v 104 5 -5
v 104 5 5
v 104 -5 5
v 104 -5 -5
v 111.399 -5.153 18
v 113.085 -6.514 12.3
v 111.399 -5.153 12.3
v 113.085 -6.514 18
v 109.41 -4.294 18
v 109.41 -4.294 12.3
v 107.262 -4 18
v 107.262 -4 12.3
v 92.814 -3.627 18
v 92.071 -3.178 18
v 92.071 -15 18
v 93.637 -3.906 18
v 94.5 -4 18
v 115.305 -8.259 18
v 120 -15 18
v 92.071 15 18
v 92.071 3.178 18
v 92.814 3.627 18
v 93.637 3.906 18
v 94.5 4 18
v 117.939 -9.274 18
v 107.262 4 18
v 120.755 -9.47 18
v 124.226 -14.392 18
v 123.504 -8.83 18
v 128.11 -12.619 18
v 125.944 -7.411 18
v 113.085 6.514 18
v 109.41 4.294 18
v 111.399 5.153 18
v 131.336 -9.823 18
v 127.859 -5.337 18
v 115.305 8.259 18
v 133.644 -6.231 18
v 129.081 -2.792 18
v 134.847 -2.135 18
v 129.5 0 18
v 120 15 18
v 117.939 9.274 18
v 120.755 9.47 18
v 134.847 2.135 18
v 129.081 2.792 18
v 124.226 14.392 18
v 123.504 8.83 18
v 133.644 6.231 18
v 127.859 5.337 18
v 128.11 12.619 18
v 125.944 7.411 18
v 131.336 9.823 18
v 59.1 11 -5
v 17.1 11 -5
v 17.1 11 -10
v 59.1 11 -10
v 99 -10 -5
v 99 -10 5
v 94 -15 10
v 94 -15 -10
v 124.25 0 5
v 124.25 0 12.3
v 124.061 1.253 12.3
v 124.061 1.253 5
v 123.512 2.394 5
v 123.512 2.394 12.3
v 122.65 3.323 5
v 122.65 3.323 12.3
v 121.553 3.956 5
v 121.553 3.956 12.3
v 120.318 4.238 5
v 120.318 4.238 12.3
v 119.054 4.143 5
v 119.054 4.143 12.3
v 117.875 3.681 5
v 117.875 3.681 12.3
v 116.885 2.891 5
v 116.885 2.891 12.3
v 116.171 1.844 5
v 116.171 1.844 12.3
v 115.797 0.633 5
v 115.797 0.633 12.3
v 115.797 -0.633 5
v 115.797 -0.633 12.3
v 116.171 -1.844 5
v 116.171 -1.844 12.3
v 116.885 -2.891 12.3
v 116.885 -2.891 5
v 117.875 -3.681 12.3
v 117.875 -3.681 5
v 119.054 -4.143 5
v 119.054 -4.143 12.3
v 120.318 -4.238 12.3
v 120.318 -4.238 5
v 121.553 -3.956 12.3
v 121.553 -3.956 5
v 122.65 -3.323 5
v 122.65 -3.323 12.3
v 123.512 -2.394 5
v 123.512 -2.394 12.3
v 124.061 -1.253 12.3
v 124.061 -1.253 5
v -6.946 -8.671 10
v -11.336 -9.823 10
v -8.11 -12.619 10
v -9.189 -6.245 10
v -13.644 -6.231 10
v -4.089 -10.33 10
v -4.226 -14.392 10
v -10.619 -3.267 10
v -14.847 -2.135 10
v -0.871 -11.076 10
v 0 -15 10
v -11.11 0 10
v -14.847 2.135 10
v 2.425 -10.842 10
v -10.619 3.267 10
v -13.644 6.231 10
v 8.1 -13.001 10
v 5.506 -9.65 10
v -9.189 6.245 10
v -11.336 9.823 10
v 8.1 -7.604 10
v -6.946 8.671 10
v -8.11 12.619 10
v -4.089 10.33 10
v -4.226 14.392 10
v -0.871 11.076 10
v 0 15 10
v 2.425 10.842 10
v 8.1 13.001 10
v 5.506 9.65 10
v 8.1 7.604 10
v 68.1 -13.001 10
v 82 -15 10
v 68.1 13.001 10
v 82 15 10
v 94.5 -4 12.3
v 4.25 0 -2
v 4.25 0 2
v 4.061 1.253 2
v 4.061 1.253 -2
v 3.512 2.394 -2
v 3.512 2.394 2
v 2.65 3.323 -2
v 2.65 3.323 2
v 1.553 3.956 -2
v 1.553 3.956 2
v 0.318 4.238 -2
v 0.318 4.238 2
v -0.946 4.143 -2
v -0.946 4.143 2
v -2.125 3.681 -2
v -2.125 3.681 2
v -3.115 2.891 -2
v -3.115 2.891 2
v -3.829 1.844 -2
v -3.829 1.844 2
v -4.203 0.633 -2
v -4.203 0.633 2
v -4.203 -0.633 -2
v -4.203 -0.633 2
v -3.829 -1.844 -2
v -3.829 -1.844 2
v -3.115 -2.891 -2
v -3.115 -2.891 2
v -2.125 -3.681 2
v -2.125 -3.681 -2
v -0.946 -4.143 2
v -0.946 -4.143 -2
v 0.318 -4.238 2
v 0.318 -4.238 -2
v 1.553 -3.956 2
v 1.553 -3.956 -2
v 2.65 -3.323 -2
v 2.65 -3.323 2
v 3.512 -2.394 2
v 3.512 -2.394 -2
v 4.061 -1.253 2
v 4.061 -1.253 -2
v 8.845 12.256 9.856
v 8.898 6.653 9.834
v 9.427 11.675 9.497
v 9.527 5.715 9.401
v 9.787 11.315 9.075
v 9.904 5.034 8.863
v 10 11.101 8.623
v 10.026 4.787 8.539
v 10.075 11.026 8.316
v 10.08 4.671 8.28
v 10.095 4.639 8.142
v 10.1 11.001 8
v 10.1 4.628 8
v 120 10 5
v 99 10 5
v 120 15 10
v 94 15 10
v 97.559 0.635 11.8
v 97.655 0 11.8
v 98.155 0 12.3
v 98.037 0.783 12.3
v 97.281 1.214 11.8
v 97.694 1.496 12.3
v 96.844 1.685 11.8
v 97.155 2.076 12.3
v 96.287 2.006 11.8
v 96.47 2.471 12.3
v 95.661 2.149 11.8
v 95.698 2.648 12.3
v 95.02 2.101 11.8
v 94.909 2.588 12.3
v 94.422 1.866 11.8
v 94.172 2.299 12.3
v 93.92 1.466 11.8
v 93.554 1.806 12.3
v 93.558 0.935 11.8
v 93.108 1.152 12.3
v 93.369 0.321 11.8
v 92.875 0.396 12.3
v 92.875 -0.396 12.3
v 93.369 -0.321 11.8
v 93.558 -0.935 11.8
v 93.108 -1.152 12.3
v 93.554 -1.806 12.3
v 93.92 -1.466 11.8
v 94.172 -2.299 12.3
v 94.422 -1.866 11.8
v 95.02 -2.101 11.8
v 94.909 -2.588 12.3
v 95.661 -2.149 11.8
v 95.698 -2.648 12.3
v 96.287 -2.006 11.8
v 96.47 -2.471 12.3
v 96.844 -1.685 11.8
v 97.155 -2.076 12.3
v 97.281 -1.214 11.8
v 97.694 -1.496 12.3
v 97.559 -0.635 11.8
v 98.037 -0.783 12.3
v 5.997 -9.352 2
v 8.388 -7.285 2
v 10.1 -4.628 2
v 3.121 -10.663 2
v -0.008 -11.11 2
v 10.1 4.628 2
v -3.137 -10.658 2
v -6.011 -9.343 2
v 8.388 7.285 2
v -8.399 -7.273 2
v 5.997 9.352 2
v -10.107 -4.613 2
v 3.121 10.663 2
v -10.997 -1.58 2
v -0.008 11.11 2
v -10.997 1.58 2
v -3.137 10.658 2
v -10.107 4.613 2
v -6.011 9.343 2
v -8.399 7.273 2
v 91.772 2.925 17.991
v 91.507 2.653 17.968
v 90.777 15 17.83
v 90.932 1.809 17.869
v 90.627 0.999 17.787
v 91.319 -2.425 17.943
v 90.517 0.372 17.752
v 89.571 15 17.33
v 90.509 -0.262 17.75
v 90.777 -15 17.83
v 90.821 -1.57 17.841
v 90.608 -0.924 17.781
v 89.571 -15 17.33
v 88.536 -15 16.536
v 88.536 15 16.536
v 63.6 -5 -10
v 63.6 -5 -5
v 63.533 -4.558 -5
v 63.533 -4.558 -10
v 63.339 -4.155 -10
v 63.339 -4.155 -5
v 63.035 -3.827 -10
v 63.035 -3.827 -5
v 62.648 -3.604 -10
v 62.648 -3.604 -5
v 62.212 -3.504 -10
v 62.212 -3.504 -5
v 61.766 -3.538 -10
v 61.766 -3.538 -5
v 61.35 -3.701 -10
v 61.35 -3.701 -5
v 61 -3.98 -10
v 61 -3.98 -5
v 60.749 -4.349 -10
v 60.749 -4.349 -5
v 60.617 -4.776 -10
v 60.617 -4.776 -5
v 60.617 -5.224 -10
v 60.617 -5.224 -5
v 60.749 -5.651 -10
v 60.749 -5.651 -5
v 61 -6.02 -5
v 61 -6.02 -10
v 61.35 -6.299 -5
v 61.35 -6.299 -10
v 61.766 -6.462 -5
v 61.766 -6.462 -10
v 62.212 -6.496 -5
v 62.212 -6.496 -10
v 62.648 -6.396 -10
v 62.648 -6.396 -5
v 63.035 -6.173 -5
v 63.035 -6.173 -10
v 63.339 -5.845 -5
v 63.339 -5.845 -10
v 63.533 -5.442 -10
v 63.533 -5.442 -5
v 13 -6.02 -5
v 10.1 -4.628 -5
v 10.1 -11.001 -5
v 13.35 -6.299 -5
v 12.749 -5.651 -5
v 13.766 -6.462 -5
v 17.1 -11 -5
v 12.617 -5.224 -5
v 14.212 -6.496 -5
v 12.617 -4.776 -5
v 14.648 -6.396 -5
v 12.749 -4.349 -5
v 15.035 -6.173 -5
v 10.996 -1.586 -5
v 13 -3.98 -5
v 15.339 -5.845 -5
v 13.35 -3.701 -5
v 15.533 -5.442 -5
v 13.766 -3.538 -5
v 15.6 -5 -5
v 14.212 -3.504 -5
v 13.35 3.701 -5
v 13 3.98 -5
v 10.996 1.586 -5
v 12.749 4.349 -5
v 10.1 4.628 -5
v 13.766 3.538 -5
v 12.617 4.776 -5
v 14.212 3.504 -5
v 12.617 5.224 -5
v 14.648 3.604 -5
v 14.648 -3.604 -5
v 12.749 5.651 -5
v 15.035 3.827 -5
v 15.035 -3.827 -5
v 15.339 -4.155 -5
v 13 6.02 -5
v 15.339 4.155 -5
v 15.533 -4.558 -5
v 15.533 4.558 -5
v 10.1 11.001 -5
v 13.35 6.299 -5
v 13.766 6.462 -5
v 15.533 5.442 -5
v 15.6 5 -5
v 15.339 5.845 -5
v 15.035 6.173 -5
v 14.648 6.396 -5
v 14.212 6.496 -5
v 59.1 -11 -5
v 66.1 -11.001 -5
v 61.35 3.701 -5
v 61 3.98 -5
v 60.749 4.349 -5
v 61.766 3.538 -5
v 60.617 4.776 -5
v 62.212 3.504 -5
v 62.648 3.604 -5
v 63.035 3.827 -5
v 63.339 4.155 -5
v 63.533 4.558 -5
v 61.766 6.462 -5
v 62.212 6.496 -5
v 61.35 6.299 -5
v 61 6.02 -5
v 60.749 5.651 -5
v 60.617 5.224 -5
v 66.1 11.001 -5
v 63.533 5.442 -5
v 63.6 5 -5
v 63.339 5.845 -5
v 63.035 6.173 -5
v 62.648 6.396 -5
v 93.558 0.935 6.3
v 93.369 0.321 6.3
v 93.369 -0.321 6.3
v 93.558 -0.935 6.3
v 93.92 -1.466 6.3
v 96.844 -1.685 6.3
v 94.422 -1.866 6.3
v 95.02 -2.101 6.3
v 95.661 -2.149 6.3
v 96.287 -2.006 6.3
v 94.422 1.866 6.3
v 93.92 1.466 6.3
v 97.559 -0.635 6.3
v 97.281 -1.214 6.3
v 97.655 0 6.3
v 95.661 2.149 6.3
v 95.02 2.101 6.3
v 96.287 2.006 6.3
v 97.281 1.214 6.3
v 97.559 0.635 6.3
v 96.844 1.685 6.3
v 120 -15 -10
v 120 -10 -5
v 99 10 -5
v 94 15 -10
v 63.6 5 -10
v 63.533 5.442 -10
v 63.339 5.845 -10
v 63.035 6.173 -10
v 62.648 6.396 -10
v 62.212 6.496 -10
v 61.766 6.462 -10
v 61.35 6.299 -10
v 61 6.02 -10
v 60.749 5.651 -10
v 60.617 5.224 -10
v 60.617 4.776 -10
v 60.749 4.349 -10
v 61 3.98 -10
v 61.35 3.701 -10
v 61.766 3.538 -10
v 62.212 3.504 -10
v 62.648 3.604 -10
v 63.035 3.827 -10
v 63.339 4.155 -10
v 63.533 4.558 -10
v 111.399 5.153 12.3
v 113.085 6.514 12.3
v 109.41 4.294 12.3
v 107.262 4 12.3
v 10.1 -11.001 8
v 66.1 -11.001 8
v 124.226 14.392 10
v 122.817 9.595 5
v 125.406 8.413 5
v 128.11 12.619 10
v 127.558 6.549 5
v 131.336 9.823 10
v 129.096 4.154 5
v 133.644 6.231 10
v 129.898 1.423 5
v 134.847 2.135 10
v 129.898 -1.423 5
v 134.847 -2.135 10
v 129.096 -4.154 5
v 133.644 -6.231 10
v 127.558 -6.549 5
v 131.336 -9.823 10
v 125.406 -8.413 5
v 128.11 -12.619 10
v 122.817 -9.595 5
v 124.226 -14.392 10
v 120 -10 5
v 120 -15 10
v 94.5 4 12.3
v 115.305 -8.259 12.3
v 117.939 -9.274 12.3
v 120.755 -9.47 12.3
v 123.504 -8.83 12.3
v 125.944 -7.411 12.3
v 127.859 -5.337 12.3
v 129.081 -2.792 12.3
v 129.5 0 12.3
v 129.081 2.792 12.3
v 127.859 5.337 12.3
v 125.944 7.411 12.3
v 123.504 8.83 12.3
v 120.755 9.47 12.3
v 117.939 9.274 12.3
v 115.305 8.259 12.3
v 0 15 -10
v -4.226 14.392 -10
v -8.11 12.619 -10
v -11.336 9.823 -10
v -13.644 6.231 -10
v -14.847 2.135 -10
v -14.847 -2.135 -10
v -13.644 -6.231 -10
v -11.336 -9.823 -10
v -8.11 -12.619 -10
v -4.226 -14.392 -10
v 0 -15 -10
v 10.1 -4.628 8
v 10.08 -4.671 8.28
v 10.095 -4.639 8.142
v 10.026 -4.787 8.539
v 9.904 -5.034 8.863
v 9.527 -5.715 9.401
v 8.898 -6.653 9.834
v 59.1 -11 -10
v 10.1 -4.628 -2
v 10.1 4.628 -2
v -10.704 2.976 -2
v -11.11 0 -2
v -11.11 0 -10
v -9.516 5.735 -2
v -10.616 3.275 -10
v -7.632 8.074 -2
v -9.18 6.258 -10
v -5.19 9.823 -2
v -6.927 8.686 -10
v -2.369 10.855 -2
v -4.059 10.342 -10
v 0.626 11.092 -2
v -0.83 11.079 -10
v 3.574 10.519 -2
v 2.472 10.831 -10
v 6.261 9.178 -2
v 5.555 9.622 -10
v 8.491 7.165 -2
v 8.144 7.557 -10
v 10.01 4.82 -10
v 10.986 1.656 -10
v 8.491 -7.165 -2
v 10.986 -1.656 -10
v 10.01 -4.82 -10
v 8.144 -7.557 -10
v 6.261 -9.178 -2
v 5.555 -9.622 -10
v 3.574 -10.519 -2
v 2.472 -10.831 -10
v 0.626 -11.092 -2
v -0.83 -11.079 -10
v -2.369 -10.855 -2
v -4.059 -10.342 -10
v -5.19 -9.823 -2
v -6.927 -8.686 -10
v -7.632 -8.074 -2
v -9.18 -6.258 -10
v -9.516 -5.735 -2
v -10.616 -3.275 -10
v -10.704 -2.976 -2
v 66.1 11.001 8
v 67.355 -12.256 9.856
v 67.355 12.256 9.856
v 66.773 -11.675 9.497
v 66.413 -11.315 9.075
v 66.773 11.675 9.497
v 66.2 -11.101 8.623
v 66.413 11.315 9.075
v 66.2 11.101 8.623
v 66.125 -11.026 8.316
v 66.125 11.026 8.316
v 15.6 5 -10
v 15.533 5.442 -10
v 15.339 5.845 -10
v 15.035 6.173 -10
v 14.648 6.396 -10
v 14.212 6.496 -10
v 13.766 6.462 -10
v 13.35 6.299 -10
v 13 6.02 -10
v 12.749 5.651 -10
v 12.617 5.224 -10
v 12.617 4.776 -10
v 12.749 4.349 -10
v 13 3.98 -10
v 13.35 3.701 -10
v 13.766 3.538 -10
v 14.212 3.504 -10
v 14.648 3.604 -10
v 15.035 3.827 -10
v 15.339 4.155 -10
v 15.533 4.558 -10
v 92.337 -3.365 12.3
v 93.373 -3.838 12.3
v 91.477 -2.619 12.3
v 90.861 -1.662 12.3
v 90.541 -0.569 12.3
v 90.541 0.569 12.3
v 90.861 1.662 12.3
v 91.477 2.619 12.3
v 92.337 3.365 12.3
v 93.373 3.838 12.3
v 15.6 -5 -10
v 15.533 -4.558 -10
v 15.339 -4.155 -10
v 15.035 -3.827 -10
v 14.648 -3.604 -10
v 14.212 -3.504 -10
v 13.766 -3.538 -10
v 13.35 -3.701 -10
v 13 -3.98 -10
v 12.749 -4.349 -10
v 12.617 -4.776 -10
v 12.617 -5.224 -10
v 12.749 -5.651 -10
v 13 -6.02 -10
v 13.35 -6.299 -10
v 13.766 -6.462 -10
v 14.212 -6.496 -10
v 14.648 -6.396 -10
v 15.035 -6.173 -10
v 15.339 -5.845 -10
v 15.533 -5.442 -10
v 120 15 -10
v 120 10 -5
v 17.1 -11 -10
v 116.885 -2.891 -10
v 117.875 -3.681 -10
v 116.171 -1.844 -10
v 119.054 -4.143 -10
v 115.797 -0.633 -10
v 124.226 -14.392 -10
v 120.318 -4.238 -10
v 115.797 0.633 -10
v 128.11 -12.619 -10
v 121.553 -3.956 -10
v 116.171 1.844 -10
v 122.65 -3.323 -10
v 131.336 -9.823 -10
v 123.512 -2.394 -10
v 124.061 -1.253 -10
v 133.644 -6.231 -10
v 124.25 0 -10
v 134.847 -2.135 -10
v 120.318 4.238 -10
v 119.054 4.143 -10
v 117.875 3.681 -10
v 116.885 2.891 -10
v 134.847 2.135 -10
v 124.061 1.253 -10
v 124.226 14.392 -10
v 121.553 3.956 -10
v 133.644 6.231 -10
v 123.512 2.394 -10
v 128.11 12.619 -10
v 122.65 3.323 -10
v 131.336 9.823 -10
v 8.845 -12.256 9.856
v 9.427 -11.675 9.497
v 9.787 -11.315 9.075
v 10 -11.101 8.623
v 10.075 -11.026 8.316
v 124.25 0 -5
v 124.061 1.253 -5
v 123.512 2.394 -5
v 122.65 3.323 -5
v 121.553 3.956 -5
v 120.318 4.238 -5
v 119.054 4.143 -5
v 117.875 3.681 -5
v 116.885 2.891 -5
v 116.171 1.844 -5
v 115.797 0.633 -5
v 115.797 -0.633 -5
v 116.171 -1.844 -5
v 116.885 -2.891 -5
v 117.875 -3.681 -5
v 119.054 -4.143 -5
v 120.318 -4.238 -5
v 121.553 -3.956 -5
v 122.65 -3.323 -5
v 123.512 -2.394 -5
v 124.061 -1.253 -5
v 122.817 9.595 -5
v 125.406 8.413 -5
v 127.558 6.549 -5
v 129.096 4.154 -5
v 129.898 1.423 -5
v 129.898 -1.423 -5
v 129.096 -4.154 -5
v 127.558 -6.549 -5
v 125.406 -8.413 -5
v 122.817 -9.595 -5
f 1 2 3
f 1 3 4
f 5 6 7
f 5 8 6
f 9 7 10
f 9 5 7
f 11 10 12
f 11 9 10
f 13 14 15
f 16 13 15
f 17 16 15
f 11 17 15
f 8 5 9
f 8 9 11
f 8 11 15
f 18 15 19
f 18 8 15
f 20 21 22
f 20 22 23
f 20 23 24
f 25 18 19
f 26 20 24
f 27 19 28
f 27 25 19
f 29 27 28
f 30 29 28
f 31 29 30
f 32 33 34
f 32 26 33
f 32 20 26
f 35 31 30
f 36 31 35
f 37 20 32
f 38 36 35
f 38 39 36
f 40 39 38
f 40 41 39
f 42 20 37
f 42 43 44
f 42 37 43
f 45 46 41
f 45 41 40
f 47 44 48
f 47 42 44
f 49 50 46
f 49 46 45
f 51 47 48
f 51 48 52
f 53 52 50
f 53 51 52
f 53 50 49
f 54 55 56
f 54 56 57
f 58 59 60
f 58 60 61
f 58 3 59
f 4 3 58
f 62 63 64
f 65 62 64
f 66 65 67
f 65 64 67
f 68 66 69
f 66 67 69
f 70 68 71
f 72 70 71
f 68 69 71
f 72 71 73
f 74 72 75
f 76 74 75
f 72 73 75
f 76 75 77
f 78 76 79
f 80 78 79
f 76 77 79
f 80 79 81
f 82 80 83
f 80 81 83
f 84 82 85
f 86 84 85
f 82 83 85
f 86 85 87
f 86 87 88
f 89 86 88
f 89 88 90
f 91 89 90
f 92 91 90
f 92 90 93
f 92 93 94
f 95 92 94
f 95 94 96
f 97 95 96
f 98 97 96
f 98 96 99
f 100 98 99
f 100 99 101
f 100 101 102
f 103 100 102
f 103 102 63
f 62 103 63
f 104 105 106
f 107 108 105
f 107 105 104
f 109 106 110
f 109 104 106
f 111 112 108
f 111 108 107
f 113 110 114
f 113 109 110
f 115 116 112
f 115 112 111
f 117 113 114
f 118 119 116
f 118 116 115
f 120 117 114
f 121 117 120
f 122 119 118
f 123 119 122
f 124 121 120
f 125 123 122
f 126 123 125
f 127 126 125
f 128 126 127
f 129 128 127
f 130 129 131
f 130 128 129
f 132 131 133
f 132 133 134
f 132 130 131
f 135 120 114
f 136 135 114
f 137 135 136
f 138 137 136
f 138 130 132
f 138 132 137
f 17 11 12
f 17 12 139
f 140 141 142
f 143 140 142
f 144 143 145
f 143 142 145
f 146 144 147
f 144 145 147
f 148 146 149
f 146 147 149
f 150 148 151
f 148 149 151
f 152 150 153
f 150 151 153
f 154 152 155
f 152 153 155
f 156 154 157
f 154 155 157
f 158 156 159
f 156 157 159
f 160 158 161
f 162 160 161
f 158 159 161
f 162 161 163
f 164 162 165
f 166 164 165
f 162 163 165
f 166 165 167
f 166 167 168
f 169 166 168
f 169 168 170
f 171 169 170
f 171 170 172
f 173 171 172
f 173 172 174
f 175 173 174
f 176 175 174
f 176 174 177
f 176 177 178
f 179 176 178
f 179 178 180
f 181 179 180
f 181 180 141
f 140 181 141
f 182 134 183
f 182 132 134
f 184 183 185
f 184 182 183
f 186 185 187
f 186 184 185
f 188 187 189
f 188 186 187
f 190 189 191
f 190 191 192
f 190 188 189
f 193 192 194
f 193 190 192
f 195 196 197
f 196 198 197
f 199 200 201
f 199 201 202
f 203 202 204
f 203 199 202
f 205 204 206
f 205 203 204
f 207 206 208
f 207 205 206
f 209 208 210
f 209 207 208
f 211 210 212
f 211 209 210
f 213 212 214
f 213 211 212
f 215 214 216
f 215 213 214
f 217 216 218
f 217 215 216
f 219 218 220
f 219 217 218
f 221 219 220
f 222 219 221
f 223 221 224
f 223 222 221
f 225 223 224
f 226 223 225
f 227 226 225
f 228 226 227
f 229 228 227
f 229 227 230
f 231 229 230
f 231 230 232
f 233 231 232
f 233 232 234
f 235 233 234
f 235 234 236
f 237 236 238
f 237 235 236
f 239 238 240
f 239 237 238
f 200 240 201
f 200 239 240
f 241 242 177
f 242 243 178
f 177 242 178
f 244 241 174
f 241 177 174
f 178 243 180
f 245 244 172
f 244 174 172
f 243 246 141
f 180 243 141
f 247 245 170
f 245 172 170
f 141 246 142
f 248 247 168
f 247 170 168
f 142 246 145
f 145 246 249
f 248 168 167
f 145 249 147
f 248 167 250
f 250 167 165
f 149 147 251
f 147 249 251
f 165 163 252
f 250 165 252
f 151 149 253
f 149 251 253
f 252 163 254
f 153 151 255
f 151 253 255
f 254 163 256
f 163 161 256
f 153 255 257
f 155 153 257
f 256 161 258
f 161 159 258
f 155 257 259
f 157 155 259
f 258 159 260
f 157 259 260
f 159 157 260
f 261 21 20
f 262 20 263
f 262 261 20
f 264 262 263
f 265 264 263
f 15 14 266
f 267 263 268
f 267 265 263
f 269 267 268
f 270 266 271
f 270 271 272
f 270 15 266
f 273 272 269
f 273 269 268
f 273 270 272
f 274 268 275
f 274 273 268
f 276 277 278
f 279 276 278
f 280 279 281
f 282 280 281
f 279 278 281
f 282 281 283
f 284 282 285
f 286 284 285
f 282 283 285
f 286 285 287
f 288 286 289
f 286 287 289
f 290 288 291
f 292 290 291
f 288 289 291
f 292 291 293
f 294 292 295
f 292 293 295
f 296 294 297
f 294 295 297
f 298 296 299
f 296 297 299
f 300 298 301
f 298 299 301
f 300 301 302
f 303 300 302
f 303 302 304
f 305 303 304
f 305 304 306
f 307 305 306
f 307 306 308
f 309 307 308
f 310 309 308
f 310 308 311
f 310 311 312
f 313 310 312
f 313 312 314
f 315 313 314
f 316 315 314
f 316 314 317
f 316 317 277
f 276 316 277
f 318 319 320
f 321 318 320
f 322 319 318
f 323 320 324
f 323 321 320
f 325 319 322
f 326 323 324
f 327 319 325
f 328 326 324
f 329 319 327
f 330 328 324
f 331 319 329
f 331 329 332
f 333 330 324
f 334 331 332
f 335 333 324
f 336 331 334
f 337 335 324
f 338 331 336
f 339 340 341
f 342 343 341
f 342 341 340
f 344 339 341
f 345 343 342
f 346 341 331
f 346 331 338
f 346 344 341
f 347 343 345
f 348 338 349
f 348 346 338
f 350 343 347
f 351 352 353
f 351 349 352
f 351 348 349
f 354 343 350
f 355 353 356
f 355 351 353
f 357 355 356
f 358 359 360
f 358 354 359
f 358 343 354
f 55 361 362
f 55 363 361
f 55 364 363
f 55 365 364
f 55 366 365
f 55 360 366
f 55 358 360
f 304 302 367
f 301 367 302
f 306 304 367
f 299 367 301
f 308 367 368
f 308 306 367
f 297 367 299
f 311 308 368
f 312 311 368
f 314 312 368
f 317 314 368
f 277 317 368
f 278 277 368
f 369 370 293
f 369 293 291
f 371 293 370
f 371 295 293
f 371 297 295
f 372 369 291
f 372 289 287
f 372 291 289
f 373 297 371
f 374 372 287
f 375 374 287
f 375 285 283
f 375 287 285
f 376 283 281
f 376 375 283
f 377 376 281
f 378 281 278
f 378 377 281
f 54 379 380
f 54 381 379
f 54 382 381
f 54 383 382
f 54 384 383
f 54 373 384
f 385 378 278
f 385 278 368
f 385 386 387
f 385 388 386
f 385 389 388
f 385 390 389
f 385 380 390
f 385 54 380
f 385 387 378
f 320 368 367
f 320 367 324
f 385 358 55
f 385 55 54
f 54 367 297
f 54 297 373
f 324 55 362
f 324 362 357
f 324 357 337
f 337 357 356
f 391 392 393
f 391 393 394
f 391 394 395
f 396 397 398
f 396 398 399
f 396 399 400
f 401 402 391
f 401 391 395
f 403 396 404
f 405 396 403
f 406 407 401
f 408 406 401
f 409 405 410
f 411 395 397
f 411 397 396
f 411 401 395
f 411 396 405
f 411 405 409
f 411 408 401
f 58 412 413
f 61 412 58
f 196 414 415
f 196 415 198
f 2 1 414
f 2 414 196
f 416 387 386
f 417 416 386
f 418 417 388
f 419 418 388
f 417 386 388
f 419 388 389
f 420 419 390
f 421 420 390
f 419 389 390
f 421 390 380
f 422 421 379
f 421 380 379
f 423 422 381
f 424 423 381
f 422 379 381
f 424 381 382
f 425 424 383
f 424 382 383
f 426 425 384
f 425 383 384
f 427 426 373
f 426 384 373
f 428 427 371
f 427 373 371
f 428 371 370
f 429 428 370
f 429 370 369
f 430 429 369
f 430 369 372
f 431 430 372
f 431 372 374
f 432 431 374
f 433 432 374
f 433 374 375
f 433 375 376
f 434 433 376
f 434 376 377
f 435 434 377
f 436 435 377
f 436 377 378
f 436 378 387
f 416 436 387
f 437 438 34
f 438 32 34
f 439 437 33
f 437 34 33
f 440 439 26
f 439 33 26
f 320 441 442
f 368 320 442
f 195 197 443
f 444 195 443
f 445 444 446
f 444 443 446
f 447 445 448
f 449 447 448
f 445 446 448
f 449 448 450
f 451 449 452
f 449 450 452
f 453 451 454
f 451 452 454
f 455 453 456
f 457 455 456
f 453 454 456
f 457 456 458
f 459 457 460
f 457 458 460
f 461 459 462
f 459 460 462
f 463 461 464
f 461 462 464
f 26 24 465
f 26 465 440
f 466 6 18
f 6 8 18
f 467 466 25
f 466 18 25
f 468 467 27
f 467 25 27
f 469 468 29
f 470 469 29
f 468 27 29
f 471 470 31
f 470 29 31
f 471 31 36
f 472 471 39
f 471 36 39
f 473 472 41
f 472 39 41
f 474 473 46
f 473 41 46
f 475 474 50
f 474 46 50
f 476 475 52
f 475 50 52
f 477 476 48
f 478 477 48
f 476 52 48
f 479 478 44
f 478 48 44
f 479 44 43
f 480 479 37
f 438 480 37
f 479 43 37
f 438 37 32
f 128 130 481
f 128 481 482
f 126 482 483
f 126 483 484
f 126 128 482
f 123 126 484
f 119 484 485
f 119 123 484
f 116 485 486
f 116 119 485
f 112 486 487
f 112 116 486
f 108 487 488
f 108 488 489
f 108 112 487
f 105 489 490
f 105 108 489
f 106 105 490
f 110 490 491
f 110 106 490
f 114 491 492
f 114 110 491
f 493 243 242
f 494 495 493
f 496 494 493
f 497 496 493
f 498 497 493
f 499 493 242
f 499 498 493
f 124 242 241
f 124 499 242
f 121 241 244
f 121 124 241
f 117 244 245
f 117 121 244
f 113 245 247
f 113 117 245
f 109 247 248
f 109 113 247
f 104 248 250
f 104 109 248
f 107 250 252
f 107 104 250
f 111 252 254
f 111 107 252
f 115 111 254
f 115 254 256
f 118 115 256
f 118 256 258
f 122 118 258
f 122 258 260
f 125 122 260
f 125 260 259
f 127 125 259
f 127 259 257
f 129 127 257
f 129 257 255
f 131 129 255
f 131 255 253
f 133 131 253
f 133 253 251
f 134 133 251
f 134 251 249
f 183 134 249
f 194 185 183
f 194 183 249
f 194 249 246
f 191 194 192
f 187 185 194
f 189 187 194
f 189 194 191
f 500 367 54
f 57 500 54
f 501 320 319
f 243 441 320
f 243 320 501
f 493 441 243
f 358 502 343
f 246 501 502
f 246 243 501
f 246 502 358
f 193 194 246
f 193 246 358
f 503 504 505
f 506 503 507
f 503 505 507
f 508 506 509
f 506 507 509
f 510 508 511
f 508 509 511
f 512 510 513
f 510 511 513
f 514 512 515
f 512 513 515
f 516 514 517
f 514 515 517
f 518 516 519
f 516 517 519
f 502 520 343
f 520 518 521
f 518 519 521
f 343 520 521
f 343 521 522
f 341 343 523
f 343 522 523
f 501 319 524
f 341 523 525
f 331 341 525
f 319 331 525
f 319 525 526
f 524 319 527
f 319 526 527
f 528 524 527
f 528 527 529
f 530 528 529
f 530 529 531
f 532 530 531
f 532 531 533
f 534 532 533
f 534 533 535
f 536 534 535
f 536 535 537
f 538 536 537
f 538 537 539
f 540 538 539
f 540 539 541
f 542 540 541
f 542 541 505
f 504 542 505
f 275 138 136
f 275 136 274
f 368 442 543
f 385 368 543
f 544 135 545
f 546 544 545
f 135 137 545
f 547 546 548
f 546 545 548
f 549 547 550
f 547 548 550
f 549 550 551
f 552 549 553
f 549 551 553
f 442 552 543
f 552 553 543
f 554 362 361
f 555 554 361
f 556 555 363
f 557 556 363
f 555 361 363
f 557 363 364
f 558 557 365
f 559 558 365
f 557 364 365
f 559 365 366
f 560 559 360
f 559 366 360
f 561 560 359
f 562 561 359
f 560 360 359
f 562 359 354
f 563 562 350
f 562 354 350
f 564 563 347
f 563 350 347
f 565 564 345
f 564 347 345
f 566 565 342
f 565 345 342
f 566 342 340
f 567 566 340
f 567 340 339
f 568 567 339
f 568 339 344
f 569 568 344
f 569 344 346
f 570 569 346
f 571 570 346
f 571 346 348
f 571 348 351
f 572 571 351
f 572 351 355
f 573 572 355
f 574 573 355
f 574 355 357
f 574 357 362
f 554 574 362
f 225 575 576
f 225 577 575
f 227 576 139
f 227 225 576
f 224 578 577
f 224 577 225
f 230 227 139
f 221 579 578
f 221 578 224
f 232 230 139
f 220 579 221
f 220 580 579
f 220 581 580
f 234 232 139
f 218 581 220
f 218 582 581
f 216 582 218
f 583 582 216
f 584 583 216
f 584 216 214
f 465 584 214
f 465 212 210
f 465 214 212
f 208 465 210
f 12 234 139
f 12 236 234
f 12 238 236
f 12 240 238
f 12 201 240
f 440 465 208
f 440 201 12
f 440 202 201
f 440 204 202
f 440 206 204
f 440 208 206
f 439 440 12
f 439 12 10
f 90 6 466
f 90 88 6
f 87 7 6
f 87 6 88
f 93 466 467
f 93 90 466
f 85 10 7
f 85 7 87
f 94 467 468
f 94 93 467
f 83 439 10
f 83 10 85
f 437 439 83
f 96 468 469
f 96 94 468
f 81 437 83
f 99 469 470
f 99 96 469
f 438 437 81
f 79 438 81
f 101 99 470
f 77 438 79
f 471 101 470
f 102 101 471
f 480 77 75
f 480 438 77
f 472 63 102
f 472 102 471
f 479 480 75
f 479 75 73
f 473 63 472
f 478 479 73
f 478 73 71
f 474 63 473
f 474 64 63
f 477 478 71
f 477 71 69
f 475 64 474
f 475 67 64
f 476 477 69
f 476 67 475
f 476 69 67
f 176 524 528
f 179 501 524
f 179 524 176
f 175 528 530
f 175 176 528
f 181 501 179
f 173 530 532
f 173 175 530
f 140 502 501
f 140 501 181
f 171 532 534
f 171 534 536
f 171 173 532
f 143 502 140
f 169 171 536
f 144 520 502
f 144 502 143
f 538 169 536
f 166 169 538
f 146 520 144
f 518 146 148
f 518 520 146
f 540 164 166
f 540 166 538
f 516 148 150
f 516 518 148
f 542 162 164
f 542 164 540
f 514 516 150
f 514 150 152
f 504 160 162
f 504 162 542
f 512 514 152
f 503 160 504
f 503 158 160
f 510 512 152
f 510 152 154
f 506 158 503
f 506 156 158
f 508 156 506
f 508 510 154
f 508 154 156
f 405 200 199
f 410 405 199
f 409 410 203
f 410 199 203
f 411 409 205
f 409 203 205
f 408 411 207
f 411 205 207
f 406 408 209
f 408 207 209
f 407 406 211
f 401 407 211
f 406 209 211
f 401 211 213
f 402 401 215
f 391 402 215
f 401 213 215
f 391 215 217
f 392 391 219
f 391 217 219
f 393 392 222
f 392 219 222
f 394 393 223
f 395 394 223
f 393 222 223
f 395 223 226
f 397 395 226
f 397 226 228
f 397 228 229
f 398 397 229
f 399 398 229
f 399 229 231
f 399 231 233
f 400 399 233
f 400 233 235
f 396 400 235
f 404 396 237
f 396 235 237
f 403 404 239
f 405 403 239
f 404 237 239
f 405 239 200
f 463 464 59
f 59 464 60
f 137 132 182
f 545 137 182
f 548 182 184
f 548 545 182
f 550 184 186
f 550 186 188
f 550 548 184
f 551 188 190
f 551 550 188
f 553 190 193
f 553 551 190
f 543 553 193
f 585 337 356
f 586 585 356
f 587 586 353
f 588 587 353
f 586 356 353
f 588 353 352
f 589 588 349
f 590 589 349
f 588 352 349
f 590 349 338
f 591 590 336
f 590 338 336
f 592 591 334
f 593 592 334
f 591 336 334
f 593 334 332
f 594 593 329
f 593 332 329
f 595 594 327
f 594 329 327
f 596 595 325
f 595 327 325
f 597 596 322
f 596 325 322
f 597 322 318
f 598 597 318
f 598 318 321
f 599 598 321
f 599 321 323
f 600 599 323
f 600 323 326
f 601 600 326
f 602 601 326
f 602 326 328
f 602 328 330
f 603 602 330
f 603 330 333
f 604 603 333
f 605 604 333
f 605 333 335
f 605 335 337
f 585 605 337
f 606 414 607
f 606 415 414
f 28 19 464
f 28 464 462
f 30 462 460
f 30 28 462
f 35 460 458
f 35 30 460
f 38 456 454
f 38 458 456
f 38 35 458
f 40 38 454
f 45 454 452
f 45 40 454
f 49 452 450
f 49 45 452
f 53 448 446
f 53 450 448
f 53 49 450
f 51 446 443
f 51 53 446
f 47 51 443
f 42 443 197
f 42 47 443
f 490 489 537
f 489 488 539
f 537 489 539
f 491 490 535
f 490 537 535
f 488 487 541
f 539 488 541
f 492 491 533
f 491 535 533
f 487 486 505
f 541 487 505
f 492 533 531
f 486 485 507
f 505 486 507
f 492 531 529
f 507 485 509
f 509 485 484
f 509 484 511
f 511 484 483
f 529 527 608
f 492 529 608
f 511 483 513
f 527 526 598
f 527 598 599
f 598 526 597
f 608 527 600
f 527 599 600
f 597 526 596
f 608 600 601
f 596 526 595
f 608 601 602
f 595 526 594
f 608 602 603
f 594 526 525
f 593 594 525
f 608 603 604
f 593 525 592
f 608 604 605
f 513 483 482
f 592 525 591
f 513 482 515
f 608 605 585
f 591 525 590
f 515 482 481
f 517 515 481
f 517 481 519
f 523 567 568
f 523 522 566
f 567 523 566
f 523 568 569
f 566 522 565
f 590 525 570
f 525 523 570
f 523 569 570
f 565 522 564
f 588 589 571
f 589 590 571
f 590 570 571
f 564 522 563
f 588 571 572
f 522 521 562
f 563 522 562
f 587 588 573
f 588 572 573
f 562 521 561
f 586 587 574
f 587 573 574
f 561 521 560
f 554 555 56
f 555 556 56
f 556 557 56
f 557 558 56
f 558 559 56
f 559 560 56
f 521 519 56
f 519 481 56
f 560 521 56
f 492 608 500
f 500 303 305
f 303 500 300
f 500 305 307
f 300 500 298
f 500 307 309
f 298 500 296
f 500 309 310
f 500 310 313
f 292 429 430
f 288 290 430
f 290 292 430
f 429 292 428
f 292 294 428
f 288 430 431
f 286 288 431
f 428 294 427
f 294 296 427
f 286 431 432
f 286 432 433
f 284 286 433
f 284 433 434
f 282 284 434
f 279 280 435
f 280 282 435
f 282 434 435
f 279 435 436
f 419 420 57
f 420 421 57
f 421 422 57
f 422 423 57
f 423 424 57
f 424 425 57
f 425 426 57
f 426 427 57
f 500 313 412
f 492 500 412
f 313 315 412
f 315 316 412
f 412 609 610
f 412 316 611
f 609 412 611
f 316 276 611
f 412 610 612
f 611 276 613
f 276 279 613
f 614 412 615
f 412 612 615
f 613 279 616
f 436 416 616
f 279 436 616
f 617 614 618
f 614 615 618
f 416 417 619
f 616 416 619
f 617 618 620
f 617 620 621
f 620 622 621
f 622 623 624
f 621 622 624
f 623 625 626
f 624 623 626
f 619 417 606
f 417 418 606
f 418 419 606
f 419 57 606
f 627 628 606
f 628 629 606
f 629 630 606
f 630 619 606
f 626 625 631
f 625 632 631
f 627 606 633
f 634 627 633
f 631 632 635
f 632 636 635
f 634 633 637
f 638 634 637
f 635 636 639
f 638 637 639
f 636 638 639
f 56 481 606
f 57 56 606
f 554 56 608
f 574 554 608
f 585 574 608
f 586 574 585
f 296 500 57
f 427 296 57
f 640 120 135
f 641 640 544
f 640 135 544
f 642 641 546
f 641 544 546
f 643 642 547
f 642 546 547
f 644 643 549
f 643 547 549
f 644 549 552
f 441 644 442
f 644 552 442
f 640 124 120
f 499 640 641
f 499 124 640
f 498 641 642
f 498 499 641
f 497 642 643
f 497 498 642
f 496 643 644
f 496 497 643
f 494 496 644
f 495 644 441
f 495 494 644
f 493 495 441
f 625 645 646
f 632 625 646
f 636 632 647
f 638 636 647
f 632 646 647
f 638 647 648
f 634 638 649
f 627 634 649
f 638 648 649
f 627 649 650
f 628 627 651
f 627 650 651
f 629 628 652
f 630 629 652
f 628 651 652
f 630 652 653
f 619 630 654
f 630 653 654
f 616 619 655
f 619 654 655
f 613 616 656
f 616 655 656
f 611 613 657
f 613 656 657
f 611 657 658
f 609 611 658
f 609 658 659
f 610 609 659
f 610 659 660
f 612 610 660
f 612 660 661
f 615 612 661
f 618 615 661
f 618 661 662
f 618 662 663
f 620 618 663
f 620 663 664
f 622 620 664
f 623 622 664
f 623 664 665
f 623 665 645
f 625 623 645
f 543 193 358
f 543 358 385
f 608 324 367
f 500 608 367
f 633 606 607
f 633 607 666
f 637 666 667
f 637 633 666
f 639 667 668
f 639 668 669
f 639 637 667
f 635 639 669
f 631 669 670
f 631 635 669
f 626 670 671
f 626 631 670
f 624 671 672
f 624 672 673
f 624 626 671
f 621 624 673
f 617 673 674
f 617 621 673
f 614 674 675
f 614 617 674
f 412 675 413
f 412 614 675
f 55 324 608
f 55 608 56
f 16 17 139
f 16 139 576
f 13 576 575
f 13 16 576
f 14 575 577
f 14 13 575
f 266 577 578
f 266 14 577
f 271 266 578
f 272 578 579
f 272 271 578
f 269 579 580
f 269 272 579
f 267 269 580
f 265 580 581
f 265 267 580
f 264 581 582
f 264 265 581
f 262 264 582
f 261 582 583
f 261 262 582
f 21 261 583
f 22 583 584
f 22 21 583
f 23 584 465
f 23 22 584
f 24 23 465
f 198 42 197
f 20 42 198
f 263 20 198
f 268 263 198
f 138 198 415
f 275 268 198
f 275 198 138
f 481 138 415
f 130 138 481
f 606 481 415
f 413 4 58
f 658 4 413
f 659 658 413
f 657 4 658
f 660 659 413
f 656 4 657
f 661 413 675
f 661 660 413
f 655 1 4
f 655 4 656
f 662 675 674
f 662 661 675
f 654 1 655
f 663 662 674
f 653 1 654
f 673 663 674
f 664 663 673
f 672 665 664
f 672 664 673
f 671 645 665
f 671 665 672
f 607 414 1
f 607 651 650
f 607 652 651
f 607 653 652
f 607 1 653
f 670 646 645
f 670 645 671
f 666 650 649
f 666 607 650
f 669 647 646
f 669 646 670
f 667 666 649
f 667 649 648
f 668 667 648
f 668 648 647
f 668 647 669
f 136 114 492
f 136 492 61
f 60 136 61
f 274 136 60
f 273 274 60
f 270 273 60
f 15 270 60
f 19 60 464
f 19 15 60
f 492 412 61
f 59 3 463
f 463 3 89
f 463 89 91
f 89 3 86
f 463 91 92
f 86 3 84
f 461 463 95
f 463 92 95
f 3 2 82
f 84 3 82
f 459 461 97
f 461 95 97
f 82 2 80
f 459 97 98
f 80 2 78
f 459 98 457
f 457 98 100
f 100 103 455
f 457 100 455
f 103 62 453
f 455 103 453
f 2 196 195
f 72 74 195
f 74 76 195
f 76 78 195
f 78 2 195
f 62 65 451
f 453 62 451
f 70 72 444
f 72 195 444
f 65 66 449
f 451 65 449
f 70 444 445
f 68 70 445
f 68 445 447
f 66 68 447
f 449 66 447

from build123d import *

# Parameters (mm, degrees)
BOSS_EXTRUDE1_DEPTH = 10
SKETCH3_3_R         = 4.25
CUT_EXTRUDE5_DEPTH  = 12
SKETCH3_R           = 4.25
CUT_EXTRUDE6_DEPTH  = 138.295302177
SKETCH4_R           = 4.25
SKETCH4_W           = 42
SKETCH4_H           = 22
CUT_EXTRUDE8_DEPTH  = 138.295302177
SKETCH5_R           = 11.11
CUT_EXTRUDE10_DEPTH = 8
SKETCH7_W           = 56
SKETCH7_H           = 22.002715538
CUT_EXTRUDE12_DEPTH = 15
SKETCH8_R           = 1.5
CUT_EXTRUDE13_DEPTH = 14
SKETCH9_R           = 9.5
CUT_EXTRUDE14_DEPTH = 12
BOSS_EXTRUDE2_START = 8
SKETCH16_R          = 9.5
BOSS_EXTRUDE2_DEPTH = 8
CHAMFER1_SIZE       = 10
FILLET1_R           = 5
FILLET2_R           = 2
BOSS_EXTRUDE3_START = 14.3
SKETCH18_R          = 9.5
SKETCH18_R_2        = 4.25
BOSS_EXTRUDE3_DEPTH = 14.3
CUT_EXTRUDE15_DEPTH = 5.7
SKETCH19_R          = 2.155
CUT_EXTRUDE16_DEPTH = 6
CHAMFER2_SIZE       = 0.5
FILLET3_R           = 8
SKETCH20_W          = 31
SKETCH20_H          = 10
CUT_EXTRUDE17_DEPTH = 140.459671624
CHAMFER4_SIZE       = 5
CHAMFER5_SIZE       = 10


# Some blends are built 0.0001 mm under size
with BuildPart() as part:
    # Sketch1 → Boss-Extrude1 (new, symmetric)
    with BuildSketch(Plane.XY):
        with BuildLine():
            Line((120, 15), (0, 15))
            ThreePointArc((0, 15), (-15, 0), (0, -15))
            Line((0, -15), (120, -15))
            ThreePointArc((120, -15), (135, 0), (120, 15))
        make_face()
    extrude(amount=BOSS_EXTRUDE1_DEPTH, both=True)

    # Sketch3<3> → Cut-Extrude5 (cut)
    with BuildSketch(Plane.XY.offset(10)):
        with BuildLine():
            Line((120, 7.5), (118.514851485, 7.351485149))
            ThreePointArc((118.514851485, 7.351485149), (112.5, 0), (118.514851485, -7.351485149))
            Line((118.514851485, -7.351485149), (120, -7.5))
            ThreePointArc((120, -7.5), (125.303300859, -5.303300859), (127.5, 0))
            ThreePointArc((127.5, 0), (125.303300859, 5.303300859), (120, 7.5))
        make_face()
        with Locations((120, 0)):
            Circle(SKETCH3_3_R, mode=Mode.SUBTRACT)
    extrude(amount=-CUT_EXTRUDE5_DEPTH, mode=Mode.SUBTRACT)

    # Sketch3 → Cut-Extrude6 (cut, through all)
    with BuildSketch(Plane.XY.offset(10)):
        with Locations((120, 0)):
            Circle(SKETCH3_R)
    extrude(amount=-CUT_EXTRUDE6_DEPTH, mode=Mode.SUBTRACT)

    # Sketch4 → Cut-Extrude8 (cut, through all)
    with BuildSketch(Plane.XY.offset(10)):
        Circle(SKETCH4_R)
        with Locations((38.1, 0)):
            Rectangle(SKETCH4_W, SKETCH4_H)
    extrude(amount=-CUT_EXTRUDE8_DEPTH, mode=Mode.SUBTRACT)

    # Sketch5 → Cut-Extrude10 (cut)
    with BuildSketch(Plane(origin=(0, 0, -10), x_dir=(-1, 0, 0), z_dir=(0, 0, -1))):
        Circle(SKETCH5_R)
    cut_extrude10 = extrude(amount=-CUT_EXTRUDE10_DEPTH, mode=Mode.SUBTRACT)

    # Mirror2: Cut-Extrude10 across plane
    add(cut_extrude10.mirror(Plane.XY), mode=Mode.SUBTRACT)

    # Sketch7 → Cut-Extrude12 (cut)
    with BuildSketch(Plane.XY.offset(10)):
        with Locations((38.1, 0)):
            Rectangle(SKETCH7_W, SKETCH7_H)
    extrude(amount=-CUT_EXTRUDE12_DEPTH, mode=Mode.SUBTRACT)

    # Sketch8 → Cut-Extrude13 (cut)
    with BuildSketch(Plane.XY.offset(-5)):
        with Locations((14.1, 5)):
            Circle(SKETCH8_R)
        with Locations((14.1, -5)):
            Circle(SKETCH8_R)
        with Locations((62.1, -5)):
            Circle(SKETCH8_R)
        with Locations((62.1, 5)):
            Circle(SKETCH8_R)
    extrude(amount=-CUT_EXTRUDE13_DEPTH, mode=Mode.SUBTRACT)

    # Sketch9 → Cut-Extrude14 (cut)
    with BuildSketch(Plane.XY.offset(10)):
        with Locations((120, 0)):
            Circle(SKETCH9_R)
    extrude(amount=-CUT_EXTRUDE14_DEPTH, mode=Mode.SUBTRACT)

    # Sketch16 → Boss-Extrude2 (add)
    with BuildSketch(Plane.XY.offset(10).offset(BOSS_EXTRUDE2_START)):
        with BuildLine():
            ThreePointArc((120, -15), (135, 0), (120, 15))
            Line((120, 15), (80, 15))
            Line((80, 15), (80, -15))
            Line((80, -15), (120, -15))
        make_face()
        with Locations((120, 0)):
            Circle(SKETCH16_R, mode=Mode.SUBTRACT)
    extrude(amount=-BOSS_EXTRUDE2_DEPTH)

    # Chamfer1
    # the kernel refuses this chamfer: 10 mm, written as the material it takes off along each edge
    with BuildSketch(Plane(origin=(80, 40.71682988, 18), x_dir=(-0.027495876610586317, 0, -0.9996219169112968), z_dir=(0, -1, 0))) as chamfer1_piece_1_section:
        Polygon((CHAMFER1_SIZE * 0.999621916911, CHAMFER1_SIZE * 0.0274958766106), (-CHAMFER1_SIZE * 0.0274958766106, CHAMFER1_SIZE * 0.999621916911), (0, 0), align=None)
    chamfer1_piece_1 = extrude(amount=81.433659759, mode=Mode.PRIVATE)
    chamfer1_piece_1 = split(chamfer1_piece_1, bisect_by=Plane(origin=(83.457184123, 0, 10), z_dir=(0, 0, 1)), keep=Keep.TOP, mode=Mode.PRIVATE)
    add(chamfer1_piece_1, mode=Mode.SUBTRACT)

    # Fillet1
    fillet1_edges = [part.edges().sort_by_distance(p)[0] for p in [
        (90, 0, 18),
    ]]
    fillet(fillet1_edges, radius=FILLET1_R)

    # Fillet2
    fillet2_edges = [part.edges().sort_by_distance(p)[0] for p in [
        (10.1, -7.81487961, 10),
        (38.1, -11.001357769, 10),
        (66.1, 0, 10),
        (38.1, 11.001357769, 10),
        (10.1, 7.81487961, 10),
    ]]
    fillet(fillet2_edges, radius=FILLET2_R)

    # Sketch18 → Boss-Extrude3 (add)
    with BuildSketch(Plane.XY.offset(-2).offset(BOSS_EXTRUDE3_START)):
        with Locations((120, 0)):
            Circle(SKETCH18_R)
        with Locations((120, 0)):
            Circle(SKETCH18_R_2, mode=Mode.SUBTRACT)
    extrude(amount=-BOSS_EXTRUDE3_DEPTH)

    # Sketch17 → Cut-Extrude15 (cut)
    with BuildSketch(Plane.XY.offset(18)):
        with BuildLine():
            Line((113.07179677, -4), (94.5, -4))
            ThreePointArc((94.5, -4), (90.5, 0), (94.5, 4))
            Line((94.5, 4), (113.07179677, 4))
            ThreePointArc((113.07179677, 4), (128, 0), (113.07179677, -4))
        make_face()
    extrude(amount=-CUT_EXTRUDE15_DEPTH, mode=Mode.SUBTRACT)

    # Sketch19 → Cut-Extrude16 (cut)
    with BuildSketch(Plane.XY.offset(12.3)):
        with Locations((95.5, 0)):
            Circle(SKETCH19_R)
    extrude(amount=-CUT_EXTRUDE16_DEPTH, mode=Mode.SUBTRACT)

    # Chamfer2
    chamfer2_edges = [part.edges().sort_by_distance(p)[0] for p in [
        (93.345, 0, 12.3),
    ]]
    chamfer(chamfer2_edges, length=CHAMFER2_SIZE)

    # Fillet3
    fillet3_edges = [part.edges().sort_by_distance(p)[0] for p in [
        (111.38315603, 4, 15.15),
        (111.38315603, -4, 15.15),
    ]]
    fillet(fillet3_edges, radius=FILLET3_R)

    # Sketch20 → Cut-Extrude17 (cut, through all)
    with BuildSketch(Plane(origin=(0, 15, 0), x_dir=(1, 0, 0), z_dir=(0, 1, 0))):
        with Locations((119.5, 0)):
            Rectangle(SKETCH20_W, SKETCH20_H)
    extrude(amount=-CUT_EXTRUDE17_DEPTH, mode=Mode.SUBTRACT)

    # Chamfer4
    chamfer4_edges = [part.edges().sort_by_distance(p)[0] for p in [
        (112, 15, 5),
        (112, 15, -5),
        (135, 0, 5),
        (112, -15, 5),
        (135, 0, -5),
        (112, -15, -5),
    ]]
    chamfer(chamfer4_edges, length=CHAMFER4_SIZE - 0.0001)  # a hair under: the kernel refuses the full size

    # Chamfer5
    chamfer5_edges = [part.edges().sort_by_distance(p)[0] for p in [
        (104, 15, 0),
        (104, -15, 0),
    ]]
    chamfer(chamfer5_edges, length=CHAMFER5_SIZE)


solid = part.part
